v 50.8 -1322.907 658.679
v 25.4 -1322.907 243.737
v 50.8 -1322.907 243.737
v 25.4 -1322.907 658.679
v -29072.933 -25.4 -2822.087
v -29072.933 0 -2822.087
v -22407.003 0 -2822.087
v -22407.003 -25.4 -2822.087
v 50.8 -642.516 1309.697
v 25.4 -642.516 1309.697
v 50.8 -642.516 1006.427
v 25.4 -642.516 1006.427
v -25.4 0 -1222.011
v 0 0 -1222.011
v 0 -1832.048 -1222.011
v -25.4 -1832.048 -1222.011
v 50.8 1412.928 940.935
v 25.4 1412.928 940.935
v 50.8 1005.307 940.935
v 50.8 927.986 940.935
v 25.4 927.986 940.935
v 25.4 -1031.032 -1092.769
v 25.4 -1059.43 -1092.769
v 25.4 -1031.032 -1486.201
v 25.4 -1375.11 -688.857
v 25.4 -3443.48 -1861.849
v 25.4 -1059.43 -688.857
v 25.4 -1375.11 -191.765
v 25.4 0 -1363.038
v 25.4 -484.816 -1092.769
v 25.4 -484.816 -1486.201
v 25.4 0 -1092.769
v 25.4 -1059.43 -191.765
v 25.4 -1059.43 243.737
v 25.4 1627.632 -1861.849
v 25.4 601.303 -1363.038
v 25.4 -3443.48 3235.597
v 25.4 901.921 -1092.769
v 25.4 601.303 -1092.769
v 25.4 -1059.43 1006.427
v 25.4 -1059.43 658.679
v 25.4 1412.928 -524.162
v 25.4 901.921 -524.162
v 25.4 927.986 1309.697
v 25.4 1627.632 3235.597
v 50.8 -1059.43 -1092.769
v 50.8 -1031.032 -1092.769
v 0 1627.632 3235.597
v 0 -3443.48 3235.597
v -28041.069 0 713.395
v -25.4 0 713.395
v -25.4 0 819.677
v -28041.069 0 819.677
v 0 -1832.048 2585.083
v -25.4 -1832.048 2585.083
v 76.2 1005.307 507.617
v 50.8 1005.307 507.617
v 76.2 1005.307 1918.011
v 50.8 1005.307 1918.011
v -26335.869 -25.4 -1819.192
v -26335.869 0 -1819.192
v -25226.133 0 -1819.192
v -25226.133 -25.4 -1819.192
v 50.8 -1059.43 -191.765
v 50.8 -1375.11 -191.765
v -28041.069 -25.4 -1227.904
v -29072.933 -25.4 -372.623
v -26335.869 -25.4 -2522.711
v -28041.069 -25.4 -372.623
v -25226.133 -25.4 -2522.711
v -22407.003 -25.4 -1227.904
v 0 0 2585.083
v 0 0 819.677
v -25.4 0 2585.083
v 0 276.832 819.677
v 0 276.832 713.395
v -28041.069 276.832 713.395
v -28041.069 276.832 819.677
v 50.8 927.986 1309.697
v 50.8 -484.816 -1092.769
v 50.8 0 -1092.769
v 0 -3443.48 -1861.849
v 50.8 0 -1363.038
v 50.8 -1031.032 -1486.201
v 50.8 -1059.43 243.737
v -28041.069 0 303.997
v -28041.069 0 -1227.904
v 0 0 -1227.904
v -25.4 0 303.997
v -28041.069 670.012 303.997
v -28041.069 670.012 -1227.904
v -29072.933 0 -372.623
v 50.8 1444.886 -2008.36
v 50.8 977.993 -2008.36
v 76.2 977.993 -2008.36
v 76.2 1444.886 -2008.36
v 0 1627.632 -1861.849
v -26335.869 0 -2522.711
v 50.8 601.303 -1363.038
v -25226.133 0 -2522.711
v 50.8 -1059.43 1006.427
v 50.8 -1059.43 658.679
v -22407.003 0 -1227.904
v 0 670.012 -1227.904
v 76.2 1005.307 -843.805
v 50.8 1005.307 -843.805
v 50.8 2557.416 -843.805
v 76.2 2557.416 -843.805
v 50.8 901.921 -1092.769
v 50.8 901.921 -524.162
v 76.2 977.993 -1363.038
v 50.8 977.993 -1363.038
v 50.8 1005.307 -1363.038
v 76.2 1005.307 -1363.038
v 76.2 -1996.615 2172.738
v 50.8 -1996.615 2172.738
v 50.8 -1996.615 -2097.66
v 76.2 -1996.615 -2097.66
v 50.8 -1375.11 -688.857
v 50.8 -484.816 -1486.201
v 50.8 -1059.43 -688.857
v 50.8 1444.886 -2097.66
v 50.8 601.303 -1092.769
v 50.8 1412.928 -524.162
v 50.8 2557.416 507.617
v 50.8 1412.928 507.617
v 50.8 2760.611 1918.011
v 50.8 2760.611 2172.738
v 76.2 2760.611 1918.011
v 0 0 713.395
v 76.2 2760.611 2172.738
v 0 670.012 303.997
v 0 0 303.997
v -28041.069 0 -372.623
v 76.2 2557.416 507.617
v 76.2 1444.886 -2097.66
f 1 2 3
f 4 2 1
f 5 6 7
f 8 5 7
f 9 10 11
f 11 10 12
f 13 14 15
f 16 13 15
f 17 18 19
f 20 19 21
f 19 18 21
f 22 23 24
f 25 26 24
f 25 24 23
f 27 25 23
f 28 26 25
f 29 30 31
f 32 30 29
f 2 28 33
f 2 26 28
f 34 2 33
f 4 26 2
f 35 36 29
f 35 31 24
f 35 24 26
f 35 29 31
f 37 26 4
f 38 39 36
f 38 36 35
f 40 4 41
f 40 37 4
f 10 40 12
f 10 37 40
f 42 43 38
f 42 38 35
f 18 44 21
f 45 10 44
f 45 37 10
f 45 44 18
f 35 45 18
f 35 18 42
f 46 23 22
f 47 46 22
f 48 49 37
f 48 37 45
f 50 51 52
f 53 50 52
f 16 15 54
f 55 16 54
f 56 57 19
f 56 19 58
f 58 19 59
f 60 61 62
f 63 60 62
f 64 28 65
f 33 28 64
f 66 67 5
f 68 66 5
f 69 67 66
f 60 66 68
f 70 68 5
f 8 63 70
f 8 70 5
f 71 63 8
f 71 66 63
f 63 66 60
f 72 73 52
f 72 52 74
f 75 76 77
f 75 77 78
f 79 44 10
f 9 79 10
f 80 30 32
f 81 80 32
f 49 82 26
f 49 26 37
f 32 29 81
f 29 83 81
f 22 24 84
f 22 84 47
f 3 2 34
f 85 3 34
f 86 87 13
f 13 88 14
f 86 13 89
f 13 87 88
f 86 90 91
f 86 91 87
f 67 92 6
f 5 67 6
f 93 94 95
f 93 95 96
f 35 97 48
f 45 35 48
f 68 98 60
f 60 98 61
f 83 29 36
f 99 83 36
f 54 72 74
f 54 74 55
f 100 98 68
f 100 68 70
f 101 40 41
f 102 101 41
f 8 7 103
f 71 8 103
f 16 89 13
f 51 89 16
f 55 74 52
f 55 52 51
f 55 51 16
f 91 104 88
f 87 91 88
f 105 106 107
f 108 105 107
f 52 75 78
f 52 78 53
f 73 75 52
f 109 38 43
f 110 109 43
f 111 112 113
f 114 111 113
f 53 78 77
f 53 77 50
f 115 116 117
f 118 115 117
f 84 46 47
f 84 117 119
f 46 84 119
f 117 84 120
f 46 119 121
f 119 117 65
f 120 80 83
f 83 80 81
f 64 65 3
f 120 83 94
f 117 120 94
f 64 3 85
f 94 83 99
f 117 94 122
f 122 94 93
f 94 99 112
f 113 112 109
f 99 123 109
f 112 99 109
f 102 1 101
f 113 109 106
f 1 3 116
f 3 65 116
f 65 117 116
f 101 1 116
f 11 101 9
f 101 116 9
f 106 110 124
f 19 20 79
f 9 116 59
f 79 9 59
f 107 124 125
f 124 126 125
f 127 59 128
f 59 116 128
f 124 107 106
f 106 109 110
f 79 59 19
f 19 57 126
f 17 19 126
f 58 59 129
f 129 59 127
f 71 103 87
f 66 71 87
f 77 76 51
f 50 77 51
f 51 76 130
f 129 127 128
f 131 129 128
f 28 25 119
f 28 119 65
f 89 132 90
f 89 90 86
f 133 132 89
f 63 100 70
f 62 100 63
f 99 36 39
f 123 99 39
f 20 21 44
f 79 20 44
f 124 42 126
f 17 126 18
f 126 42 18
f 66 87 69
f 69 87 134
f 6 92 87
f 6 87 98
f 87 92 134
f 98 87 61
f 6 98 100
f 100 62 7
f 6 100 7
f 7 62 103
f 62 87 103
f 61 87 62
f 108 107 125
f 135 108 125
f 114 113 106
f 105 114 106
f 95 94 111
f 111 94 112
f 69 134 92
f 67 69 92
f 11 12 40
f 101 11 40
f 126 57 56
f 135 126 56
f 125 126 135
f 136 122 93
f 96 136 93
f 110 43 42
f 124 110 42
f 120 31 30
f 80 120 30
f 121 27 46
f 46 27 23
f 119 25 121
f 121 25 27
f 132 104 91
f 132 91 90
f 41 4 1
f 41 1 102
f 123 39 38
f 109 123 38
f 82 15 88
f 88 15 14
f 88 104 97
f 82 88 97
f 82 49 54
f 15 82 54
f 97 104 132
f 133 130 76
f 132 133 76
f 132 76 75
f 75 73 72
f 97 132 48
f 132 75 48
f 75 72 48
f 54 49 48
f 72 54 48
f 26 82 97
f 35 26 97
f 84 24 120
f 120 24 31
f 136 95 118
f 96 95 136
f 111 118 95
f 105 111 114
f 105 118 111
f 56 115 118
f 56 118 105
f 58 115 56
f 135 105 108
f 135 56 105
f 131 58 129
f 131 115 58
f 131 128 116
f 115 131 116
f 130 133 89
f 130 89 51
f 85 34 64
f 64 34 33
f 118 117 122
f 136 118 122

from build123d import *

# Parameters (mm, degrees)
F0_W      = 1666.3101315498
F0_H      = 1440.3567910194
F0_W_2    = 321.9513893127
F0_H_2    = 173.8705039024
F1_DEPTH  = 25.4
F2_W      = 601.3025641441
F2_H      = 270.2689170837
F2_W_2    = 546.2159514427
F2_H_2    = 393.4317827225
F2_W_3    = 484.9420785904
F2_H_3    = 512.361317873
F2_W_4    = 315.6808614731
F2_H_4    = 497.0915317535
F2_W_5    = 263.4772062302
F2_H_5    = 414.9414896965
F3_DEPTH  = 25.4
F4_W      = 1832.0484161377
F4_H      = 3807.0937395096
F5_DEPTH  = 25.4
F6_W      = 670.0121164322
F6_H      = 1531.9002270699
F6_W_2    = 276.8320441246
F6_H_2    = 106.2819361687
F7_DEPTH  = 28066.4691925049
F8_W      = 5071.1117982864
F8_H      = 5097.4462032318
F9_DEPTH  = 25.4
F10_W     = 1443.1173034668
F10_H     = 1491.5601015091
F10_W_2   = 1109.7354888916
F10_H_2   = 703.5193443298
F10_W_3   = 2133.3904266357
F10_H_3   = 1594.1830873489
F11_DEPTH = 25.4
F12_W     = 2353.1031608582
F12_H     = 645.3219652176
F12_H_2   = 89.3001556396
F12_W_2   = 1552.1093606949
F12_H_3   = 1351.4214754105
F12_W_3   = 466.8933153152
F13_DEPTH = 25.4


with BuildPart() as f1:
    # F0 (on Right) → F1 (new body)
    with BuildSketch(Plane.YZ):
        with Locations((-82.8691422939, -112.1042668819)):
            Rectangle(F0_W, F0_H)
        with Locations((160.9756946564, 86.9352519512)):
            Rectangle(F0_W_2, F0_H_2, mode=Mode.SUBTRACT)
    extrude(amount=F1_DEPTH)

    # F2 (on face) → F3 (join)
    with BuildSketch(Plane.YZ.offset(25.4)):
        Polygon((601.3025641441, -1092.7692651749), (901.9212722778, -1092.7692651749), (901.9212722778, -524.1619944572), (901.9212722778, 428.5740554333), (901.9212722778, 856.0312390327), (-642.5161361694, 856.0312390327), (-1059.429526329, 856.0312390327), (-1059.429526329, 658.6785316467), (-1059.429526329, 243.7370419502), (-1059.429526329, -191.7653083801), (-1059.429526329, -688.8568401337), (-1059.429526329, -1092.7692651749), (-1031.0319662094, -1092.7692651749), (-484.8160147667, -1092.7692651749), (0, -1092.7692651749), align=None)
        with Locations((300.6512820721, -1227.9037237167)):
            Rectangle(F2_W, F2_H)
        Polygon((901.9212722778, 428.5740554333), (901.9212722778, -524.1619944572), (1412.9276275635, -524.1619944572), (1412.9276275635, 428.5740554333), (927.9855489731, 428.5740554333), align=None)
        Polygon((901.9212722778, 856.0312390327), (901.9212722778, 428.5740554333), (927.9855489731, 428.5740554333), (927.9855489731, 940.9353733063), (-642.5161361694, 940.9353733063), (-642.5161361694, 856.0312390327), align=None)
        with Locations((-757.9239904881, -1289.4851565361)):
            Rectangle(F2_W_2, F2_H_2)
        with Locations((1170.4565882683, 684.7547143698)):
            Rectangle(F2_W_3, F2_H_3)
        Polygon((-1059.429526329, 856.0312390327), (-642.5161361694, 856.0312390327), (-642.5161361694, 940.9353733063), (-642.5161361694, 1006.4268112183), (-1059.429526329, 1006.4268112183), align=None)
        Polygon((-642.5161361694, 940.9353733063), (927.9855489731, 940.9353733063), (927.9855489731, 1309.6973896027), (-642.5161361694, 1309.6973896027), (-642.5161361694, 1006.4268112183), align=None)
        with Locations((-1217.2699570656, -440.3110742569)):
            Rectangle(F2_W_4, F2_H_4)
        with Locations((-1191.1681294441, 451.2077867985)):
            Rectangle(F2_W_5, F2_H_5)
    extrude(amount=F3_DEPTH)

    # F4 (on face) → F5 (join)
    with BuildSketch(Plane(origin=(0, 0, 0), x_dir=(0, -1, 0), z_dir=(-1, 0, 0))):
        with Locations((916.0242080688, 681.5358996391)):
            Rectangle(F4_W, F4_H)
    extrude(amount=F5_DEPTH)

    # F6 (on face) → F7 (join)
    with BuildSketch(Plane(origin=(25.4, 0, 0), x_dir=(0, -1, 0), z_dir=(-1, 0, 0))):
        with Locations((-335.0060582161, -461.9536101818)):
            Rectangle(F6_W, F6_H)
        with Locations((-138.4160220623, 766.5357291698)):
            Rectangle(F6_W_2, F6_H_2)
    extrude(amount=F7_DEPTH)

    # F8 (on face) → F9 (join)
    with BuildSketch(Plane.YZ):
        with Locations((-907.9238772392, 686.8742704391)):
            Rectangle(F8_W, F8_H)
    extrude(amount=F9_DEPTH)

    # F12 (on face) → F13 (join)
    with BuildSketch(Plane.YZ.offset(50.8)):
        Polygon((-1996.6151714325, 2172.7378368378), (-1996.6151714325, 1918.0111885071), (-1375.1103878021, 1918.0111885071), (1005.3068399429, 1918.0111885071), (2760.6105804443, 1918.0111885071), (2760.6105804443, 2172.7378368378), align=None)
        Polygon((-1375.1103878021, 1918.0111885071), (-1996.6151714325, 1918.0111885071), (-1996.6151714325, -2097.6603031158), (-1375.1103878021, -2097.6603031158), (-1375.1103878021, -2008.3601474762), (-1375.1103878021, -1363.0381822586), align=None)
        Polygon((1005.3068399429, 1918.0111885071), (-1375.1103878021, 1918.0111885071), (-1375.1103878021, -1363.0381822586), (977.992773056, -1363.0381822586), (1005.3068399429, -1363.0381822586), (1005.3068399429, -843.8047766685), (1005.3068399429, 507.6166987419), align=None)
        with Locations((-198.558807373, -1685.6991648674)):
            Rectangle(F12_W, F12_H)
        with Locations((-198.558807373, -2053.010225296)):
            Rectangle(F12_W, F12_H_2)
        with Locations((1781.3615202904, -168.0940389633)):
            Rectangle(F12_W_2, F12_H_3)
        with Locations((1211.4394307137, -2053.010225296)):
            Rectangle(F12_W_3, F12_H_2)
    extrude(amount=F13_DEPTH)


with BuildPart() as f11:
    # F10 (on face) → F11 (new body)
    with BuildSketch(Plane.XZ):
        with Locations((-27319.5105407715, -1973.6837744713)):
            Rectangle(F10_W, F10_H)
        Polygon((-28041.0691925049, -2719.4638252258), (-28041.0691925049, -1227.9037237167), (-28041.0691925049, -372.6229667664), (-29072.9331970215, -372.6229667664), (-29072.9331970215, -2822.0868110657), (-28041.0691925049, -2822.0868110657), align=None)
        Polygon((-24540.3938293457, -1227.9037237167), (-26597.9518890381, -1227.9037237167), (-26597.9518890381, -2719.4638252258), (-28041.0691925049, -2719.4638252258), (-28041.0691925049, -2822.0868110657), (-24540.3938293457, -2822.0868110657), align=None)
        with Locations((-25781.0010910034, -2170.9516048431)):
            Rectangle(F10_W_2, F10_H_2, mode=Mode.SUBTRACT)
        with Locations((-23473.6986160278, -2024.9952673912)):
            Rectangle(F10_W_3, F10_H_3)
    extrude(amount=F11_DEPTH)


solid = Compound([f1.part, f11.part])
